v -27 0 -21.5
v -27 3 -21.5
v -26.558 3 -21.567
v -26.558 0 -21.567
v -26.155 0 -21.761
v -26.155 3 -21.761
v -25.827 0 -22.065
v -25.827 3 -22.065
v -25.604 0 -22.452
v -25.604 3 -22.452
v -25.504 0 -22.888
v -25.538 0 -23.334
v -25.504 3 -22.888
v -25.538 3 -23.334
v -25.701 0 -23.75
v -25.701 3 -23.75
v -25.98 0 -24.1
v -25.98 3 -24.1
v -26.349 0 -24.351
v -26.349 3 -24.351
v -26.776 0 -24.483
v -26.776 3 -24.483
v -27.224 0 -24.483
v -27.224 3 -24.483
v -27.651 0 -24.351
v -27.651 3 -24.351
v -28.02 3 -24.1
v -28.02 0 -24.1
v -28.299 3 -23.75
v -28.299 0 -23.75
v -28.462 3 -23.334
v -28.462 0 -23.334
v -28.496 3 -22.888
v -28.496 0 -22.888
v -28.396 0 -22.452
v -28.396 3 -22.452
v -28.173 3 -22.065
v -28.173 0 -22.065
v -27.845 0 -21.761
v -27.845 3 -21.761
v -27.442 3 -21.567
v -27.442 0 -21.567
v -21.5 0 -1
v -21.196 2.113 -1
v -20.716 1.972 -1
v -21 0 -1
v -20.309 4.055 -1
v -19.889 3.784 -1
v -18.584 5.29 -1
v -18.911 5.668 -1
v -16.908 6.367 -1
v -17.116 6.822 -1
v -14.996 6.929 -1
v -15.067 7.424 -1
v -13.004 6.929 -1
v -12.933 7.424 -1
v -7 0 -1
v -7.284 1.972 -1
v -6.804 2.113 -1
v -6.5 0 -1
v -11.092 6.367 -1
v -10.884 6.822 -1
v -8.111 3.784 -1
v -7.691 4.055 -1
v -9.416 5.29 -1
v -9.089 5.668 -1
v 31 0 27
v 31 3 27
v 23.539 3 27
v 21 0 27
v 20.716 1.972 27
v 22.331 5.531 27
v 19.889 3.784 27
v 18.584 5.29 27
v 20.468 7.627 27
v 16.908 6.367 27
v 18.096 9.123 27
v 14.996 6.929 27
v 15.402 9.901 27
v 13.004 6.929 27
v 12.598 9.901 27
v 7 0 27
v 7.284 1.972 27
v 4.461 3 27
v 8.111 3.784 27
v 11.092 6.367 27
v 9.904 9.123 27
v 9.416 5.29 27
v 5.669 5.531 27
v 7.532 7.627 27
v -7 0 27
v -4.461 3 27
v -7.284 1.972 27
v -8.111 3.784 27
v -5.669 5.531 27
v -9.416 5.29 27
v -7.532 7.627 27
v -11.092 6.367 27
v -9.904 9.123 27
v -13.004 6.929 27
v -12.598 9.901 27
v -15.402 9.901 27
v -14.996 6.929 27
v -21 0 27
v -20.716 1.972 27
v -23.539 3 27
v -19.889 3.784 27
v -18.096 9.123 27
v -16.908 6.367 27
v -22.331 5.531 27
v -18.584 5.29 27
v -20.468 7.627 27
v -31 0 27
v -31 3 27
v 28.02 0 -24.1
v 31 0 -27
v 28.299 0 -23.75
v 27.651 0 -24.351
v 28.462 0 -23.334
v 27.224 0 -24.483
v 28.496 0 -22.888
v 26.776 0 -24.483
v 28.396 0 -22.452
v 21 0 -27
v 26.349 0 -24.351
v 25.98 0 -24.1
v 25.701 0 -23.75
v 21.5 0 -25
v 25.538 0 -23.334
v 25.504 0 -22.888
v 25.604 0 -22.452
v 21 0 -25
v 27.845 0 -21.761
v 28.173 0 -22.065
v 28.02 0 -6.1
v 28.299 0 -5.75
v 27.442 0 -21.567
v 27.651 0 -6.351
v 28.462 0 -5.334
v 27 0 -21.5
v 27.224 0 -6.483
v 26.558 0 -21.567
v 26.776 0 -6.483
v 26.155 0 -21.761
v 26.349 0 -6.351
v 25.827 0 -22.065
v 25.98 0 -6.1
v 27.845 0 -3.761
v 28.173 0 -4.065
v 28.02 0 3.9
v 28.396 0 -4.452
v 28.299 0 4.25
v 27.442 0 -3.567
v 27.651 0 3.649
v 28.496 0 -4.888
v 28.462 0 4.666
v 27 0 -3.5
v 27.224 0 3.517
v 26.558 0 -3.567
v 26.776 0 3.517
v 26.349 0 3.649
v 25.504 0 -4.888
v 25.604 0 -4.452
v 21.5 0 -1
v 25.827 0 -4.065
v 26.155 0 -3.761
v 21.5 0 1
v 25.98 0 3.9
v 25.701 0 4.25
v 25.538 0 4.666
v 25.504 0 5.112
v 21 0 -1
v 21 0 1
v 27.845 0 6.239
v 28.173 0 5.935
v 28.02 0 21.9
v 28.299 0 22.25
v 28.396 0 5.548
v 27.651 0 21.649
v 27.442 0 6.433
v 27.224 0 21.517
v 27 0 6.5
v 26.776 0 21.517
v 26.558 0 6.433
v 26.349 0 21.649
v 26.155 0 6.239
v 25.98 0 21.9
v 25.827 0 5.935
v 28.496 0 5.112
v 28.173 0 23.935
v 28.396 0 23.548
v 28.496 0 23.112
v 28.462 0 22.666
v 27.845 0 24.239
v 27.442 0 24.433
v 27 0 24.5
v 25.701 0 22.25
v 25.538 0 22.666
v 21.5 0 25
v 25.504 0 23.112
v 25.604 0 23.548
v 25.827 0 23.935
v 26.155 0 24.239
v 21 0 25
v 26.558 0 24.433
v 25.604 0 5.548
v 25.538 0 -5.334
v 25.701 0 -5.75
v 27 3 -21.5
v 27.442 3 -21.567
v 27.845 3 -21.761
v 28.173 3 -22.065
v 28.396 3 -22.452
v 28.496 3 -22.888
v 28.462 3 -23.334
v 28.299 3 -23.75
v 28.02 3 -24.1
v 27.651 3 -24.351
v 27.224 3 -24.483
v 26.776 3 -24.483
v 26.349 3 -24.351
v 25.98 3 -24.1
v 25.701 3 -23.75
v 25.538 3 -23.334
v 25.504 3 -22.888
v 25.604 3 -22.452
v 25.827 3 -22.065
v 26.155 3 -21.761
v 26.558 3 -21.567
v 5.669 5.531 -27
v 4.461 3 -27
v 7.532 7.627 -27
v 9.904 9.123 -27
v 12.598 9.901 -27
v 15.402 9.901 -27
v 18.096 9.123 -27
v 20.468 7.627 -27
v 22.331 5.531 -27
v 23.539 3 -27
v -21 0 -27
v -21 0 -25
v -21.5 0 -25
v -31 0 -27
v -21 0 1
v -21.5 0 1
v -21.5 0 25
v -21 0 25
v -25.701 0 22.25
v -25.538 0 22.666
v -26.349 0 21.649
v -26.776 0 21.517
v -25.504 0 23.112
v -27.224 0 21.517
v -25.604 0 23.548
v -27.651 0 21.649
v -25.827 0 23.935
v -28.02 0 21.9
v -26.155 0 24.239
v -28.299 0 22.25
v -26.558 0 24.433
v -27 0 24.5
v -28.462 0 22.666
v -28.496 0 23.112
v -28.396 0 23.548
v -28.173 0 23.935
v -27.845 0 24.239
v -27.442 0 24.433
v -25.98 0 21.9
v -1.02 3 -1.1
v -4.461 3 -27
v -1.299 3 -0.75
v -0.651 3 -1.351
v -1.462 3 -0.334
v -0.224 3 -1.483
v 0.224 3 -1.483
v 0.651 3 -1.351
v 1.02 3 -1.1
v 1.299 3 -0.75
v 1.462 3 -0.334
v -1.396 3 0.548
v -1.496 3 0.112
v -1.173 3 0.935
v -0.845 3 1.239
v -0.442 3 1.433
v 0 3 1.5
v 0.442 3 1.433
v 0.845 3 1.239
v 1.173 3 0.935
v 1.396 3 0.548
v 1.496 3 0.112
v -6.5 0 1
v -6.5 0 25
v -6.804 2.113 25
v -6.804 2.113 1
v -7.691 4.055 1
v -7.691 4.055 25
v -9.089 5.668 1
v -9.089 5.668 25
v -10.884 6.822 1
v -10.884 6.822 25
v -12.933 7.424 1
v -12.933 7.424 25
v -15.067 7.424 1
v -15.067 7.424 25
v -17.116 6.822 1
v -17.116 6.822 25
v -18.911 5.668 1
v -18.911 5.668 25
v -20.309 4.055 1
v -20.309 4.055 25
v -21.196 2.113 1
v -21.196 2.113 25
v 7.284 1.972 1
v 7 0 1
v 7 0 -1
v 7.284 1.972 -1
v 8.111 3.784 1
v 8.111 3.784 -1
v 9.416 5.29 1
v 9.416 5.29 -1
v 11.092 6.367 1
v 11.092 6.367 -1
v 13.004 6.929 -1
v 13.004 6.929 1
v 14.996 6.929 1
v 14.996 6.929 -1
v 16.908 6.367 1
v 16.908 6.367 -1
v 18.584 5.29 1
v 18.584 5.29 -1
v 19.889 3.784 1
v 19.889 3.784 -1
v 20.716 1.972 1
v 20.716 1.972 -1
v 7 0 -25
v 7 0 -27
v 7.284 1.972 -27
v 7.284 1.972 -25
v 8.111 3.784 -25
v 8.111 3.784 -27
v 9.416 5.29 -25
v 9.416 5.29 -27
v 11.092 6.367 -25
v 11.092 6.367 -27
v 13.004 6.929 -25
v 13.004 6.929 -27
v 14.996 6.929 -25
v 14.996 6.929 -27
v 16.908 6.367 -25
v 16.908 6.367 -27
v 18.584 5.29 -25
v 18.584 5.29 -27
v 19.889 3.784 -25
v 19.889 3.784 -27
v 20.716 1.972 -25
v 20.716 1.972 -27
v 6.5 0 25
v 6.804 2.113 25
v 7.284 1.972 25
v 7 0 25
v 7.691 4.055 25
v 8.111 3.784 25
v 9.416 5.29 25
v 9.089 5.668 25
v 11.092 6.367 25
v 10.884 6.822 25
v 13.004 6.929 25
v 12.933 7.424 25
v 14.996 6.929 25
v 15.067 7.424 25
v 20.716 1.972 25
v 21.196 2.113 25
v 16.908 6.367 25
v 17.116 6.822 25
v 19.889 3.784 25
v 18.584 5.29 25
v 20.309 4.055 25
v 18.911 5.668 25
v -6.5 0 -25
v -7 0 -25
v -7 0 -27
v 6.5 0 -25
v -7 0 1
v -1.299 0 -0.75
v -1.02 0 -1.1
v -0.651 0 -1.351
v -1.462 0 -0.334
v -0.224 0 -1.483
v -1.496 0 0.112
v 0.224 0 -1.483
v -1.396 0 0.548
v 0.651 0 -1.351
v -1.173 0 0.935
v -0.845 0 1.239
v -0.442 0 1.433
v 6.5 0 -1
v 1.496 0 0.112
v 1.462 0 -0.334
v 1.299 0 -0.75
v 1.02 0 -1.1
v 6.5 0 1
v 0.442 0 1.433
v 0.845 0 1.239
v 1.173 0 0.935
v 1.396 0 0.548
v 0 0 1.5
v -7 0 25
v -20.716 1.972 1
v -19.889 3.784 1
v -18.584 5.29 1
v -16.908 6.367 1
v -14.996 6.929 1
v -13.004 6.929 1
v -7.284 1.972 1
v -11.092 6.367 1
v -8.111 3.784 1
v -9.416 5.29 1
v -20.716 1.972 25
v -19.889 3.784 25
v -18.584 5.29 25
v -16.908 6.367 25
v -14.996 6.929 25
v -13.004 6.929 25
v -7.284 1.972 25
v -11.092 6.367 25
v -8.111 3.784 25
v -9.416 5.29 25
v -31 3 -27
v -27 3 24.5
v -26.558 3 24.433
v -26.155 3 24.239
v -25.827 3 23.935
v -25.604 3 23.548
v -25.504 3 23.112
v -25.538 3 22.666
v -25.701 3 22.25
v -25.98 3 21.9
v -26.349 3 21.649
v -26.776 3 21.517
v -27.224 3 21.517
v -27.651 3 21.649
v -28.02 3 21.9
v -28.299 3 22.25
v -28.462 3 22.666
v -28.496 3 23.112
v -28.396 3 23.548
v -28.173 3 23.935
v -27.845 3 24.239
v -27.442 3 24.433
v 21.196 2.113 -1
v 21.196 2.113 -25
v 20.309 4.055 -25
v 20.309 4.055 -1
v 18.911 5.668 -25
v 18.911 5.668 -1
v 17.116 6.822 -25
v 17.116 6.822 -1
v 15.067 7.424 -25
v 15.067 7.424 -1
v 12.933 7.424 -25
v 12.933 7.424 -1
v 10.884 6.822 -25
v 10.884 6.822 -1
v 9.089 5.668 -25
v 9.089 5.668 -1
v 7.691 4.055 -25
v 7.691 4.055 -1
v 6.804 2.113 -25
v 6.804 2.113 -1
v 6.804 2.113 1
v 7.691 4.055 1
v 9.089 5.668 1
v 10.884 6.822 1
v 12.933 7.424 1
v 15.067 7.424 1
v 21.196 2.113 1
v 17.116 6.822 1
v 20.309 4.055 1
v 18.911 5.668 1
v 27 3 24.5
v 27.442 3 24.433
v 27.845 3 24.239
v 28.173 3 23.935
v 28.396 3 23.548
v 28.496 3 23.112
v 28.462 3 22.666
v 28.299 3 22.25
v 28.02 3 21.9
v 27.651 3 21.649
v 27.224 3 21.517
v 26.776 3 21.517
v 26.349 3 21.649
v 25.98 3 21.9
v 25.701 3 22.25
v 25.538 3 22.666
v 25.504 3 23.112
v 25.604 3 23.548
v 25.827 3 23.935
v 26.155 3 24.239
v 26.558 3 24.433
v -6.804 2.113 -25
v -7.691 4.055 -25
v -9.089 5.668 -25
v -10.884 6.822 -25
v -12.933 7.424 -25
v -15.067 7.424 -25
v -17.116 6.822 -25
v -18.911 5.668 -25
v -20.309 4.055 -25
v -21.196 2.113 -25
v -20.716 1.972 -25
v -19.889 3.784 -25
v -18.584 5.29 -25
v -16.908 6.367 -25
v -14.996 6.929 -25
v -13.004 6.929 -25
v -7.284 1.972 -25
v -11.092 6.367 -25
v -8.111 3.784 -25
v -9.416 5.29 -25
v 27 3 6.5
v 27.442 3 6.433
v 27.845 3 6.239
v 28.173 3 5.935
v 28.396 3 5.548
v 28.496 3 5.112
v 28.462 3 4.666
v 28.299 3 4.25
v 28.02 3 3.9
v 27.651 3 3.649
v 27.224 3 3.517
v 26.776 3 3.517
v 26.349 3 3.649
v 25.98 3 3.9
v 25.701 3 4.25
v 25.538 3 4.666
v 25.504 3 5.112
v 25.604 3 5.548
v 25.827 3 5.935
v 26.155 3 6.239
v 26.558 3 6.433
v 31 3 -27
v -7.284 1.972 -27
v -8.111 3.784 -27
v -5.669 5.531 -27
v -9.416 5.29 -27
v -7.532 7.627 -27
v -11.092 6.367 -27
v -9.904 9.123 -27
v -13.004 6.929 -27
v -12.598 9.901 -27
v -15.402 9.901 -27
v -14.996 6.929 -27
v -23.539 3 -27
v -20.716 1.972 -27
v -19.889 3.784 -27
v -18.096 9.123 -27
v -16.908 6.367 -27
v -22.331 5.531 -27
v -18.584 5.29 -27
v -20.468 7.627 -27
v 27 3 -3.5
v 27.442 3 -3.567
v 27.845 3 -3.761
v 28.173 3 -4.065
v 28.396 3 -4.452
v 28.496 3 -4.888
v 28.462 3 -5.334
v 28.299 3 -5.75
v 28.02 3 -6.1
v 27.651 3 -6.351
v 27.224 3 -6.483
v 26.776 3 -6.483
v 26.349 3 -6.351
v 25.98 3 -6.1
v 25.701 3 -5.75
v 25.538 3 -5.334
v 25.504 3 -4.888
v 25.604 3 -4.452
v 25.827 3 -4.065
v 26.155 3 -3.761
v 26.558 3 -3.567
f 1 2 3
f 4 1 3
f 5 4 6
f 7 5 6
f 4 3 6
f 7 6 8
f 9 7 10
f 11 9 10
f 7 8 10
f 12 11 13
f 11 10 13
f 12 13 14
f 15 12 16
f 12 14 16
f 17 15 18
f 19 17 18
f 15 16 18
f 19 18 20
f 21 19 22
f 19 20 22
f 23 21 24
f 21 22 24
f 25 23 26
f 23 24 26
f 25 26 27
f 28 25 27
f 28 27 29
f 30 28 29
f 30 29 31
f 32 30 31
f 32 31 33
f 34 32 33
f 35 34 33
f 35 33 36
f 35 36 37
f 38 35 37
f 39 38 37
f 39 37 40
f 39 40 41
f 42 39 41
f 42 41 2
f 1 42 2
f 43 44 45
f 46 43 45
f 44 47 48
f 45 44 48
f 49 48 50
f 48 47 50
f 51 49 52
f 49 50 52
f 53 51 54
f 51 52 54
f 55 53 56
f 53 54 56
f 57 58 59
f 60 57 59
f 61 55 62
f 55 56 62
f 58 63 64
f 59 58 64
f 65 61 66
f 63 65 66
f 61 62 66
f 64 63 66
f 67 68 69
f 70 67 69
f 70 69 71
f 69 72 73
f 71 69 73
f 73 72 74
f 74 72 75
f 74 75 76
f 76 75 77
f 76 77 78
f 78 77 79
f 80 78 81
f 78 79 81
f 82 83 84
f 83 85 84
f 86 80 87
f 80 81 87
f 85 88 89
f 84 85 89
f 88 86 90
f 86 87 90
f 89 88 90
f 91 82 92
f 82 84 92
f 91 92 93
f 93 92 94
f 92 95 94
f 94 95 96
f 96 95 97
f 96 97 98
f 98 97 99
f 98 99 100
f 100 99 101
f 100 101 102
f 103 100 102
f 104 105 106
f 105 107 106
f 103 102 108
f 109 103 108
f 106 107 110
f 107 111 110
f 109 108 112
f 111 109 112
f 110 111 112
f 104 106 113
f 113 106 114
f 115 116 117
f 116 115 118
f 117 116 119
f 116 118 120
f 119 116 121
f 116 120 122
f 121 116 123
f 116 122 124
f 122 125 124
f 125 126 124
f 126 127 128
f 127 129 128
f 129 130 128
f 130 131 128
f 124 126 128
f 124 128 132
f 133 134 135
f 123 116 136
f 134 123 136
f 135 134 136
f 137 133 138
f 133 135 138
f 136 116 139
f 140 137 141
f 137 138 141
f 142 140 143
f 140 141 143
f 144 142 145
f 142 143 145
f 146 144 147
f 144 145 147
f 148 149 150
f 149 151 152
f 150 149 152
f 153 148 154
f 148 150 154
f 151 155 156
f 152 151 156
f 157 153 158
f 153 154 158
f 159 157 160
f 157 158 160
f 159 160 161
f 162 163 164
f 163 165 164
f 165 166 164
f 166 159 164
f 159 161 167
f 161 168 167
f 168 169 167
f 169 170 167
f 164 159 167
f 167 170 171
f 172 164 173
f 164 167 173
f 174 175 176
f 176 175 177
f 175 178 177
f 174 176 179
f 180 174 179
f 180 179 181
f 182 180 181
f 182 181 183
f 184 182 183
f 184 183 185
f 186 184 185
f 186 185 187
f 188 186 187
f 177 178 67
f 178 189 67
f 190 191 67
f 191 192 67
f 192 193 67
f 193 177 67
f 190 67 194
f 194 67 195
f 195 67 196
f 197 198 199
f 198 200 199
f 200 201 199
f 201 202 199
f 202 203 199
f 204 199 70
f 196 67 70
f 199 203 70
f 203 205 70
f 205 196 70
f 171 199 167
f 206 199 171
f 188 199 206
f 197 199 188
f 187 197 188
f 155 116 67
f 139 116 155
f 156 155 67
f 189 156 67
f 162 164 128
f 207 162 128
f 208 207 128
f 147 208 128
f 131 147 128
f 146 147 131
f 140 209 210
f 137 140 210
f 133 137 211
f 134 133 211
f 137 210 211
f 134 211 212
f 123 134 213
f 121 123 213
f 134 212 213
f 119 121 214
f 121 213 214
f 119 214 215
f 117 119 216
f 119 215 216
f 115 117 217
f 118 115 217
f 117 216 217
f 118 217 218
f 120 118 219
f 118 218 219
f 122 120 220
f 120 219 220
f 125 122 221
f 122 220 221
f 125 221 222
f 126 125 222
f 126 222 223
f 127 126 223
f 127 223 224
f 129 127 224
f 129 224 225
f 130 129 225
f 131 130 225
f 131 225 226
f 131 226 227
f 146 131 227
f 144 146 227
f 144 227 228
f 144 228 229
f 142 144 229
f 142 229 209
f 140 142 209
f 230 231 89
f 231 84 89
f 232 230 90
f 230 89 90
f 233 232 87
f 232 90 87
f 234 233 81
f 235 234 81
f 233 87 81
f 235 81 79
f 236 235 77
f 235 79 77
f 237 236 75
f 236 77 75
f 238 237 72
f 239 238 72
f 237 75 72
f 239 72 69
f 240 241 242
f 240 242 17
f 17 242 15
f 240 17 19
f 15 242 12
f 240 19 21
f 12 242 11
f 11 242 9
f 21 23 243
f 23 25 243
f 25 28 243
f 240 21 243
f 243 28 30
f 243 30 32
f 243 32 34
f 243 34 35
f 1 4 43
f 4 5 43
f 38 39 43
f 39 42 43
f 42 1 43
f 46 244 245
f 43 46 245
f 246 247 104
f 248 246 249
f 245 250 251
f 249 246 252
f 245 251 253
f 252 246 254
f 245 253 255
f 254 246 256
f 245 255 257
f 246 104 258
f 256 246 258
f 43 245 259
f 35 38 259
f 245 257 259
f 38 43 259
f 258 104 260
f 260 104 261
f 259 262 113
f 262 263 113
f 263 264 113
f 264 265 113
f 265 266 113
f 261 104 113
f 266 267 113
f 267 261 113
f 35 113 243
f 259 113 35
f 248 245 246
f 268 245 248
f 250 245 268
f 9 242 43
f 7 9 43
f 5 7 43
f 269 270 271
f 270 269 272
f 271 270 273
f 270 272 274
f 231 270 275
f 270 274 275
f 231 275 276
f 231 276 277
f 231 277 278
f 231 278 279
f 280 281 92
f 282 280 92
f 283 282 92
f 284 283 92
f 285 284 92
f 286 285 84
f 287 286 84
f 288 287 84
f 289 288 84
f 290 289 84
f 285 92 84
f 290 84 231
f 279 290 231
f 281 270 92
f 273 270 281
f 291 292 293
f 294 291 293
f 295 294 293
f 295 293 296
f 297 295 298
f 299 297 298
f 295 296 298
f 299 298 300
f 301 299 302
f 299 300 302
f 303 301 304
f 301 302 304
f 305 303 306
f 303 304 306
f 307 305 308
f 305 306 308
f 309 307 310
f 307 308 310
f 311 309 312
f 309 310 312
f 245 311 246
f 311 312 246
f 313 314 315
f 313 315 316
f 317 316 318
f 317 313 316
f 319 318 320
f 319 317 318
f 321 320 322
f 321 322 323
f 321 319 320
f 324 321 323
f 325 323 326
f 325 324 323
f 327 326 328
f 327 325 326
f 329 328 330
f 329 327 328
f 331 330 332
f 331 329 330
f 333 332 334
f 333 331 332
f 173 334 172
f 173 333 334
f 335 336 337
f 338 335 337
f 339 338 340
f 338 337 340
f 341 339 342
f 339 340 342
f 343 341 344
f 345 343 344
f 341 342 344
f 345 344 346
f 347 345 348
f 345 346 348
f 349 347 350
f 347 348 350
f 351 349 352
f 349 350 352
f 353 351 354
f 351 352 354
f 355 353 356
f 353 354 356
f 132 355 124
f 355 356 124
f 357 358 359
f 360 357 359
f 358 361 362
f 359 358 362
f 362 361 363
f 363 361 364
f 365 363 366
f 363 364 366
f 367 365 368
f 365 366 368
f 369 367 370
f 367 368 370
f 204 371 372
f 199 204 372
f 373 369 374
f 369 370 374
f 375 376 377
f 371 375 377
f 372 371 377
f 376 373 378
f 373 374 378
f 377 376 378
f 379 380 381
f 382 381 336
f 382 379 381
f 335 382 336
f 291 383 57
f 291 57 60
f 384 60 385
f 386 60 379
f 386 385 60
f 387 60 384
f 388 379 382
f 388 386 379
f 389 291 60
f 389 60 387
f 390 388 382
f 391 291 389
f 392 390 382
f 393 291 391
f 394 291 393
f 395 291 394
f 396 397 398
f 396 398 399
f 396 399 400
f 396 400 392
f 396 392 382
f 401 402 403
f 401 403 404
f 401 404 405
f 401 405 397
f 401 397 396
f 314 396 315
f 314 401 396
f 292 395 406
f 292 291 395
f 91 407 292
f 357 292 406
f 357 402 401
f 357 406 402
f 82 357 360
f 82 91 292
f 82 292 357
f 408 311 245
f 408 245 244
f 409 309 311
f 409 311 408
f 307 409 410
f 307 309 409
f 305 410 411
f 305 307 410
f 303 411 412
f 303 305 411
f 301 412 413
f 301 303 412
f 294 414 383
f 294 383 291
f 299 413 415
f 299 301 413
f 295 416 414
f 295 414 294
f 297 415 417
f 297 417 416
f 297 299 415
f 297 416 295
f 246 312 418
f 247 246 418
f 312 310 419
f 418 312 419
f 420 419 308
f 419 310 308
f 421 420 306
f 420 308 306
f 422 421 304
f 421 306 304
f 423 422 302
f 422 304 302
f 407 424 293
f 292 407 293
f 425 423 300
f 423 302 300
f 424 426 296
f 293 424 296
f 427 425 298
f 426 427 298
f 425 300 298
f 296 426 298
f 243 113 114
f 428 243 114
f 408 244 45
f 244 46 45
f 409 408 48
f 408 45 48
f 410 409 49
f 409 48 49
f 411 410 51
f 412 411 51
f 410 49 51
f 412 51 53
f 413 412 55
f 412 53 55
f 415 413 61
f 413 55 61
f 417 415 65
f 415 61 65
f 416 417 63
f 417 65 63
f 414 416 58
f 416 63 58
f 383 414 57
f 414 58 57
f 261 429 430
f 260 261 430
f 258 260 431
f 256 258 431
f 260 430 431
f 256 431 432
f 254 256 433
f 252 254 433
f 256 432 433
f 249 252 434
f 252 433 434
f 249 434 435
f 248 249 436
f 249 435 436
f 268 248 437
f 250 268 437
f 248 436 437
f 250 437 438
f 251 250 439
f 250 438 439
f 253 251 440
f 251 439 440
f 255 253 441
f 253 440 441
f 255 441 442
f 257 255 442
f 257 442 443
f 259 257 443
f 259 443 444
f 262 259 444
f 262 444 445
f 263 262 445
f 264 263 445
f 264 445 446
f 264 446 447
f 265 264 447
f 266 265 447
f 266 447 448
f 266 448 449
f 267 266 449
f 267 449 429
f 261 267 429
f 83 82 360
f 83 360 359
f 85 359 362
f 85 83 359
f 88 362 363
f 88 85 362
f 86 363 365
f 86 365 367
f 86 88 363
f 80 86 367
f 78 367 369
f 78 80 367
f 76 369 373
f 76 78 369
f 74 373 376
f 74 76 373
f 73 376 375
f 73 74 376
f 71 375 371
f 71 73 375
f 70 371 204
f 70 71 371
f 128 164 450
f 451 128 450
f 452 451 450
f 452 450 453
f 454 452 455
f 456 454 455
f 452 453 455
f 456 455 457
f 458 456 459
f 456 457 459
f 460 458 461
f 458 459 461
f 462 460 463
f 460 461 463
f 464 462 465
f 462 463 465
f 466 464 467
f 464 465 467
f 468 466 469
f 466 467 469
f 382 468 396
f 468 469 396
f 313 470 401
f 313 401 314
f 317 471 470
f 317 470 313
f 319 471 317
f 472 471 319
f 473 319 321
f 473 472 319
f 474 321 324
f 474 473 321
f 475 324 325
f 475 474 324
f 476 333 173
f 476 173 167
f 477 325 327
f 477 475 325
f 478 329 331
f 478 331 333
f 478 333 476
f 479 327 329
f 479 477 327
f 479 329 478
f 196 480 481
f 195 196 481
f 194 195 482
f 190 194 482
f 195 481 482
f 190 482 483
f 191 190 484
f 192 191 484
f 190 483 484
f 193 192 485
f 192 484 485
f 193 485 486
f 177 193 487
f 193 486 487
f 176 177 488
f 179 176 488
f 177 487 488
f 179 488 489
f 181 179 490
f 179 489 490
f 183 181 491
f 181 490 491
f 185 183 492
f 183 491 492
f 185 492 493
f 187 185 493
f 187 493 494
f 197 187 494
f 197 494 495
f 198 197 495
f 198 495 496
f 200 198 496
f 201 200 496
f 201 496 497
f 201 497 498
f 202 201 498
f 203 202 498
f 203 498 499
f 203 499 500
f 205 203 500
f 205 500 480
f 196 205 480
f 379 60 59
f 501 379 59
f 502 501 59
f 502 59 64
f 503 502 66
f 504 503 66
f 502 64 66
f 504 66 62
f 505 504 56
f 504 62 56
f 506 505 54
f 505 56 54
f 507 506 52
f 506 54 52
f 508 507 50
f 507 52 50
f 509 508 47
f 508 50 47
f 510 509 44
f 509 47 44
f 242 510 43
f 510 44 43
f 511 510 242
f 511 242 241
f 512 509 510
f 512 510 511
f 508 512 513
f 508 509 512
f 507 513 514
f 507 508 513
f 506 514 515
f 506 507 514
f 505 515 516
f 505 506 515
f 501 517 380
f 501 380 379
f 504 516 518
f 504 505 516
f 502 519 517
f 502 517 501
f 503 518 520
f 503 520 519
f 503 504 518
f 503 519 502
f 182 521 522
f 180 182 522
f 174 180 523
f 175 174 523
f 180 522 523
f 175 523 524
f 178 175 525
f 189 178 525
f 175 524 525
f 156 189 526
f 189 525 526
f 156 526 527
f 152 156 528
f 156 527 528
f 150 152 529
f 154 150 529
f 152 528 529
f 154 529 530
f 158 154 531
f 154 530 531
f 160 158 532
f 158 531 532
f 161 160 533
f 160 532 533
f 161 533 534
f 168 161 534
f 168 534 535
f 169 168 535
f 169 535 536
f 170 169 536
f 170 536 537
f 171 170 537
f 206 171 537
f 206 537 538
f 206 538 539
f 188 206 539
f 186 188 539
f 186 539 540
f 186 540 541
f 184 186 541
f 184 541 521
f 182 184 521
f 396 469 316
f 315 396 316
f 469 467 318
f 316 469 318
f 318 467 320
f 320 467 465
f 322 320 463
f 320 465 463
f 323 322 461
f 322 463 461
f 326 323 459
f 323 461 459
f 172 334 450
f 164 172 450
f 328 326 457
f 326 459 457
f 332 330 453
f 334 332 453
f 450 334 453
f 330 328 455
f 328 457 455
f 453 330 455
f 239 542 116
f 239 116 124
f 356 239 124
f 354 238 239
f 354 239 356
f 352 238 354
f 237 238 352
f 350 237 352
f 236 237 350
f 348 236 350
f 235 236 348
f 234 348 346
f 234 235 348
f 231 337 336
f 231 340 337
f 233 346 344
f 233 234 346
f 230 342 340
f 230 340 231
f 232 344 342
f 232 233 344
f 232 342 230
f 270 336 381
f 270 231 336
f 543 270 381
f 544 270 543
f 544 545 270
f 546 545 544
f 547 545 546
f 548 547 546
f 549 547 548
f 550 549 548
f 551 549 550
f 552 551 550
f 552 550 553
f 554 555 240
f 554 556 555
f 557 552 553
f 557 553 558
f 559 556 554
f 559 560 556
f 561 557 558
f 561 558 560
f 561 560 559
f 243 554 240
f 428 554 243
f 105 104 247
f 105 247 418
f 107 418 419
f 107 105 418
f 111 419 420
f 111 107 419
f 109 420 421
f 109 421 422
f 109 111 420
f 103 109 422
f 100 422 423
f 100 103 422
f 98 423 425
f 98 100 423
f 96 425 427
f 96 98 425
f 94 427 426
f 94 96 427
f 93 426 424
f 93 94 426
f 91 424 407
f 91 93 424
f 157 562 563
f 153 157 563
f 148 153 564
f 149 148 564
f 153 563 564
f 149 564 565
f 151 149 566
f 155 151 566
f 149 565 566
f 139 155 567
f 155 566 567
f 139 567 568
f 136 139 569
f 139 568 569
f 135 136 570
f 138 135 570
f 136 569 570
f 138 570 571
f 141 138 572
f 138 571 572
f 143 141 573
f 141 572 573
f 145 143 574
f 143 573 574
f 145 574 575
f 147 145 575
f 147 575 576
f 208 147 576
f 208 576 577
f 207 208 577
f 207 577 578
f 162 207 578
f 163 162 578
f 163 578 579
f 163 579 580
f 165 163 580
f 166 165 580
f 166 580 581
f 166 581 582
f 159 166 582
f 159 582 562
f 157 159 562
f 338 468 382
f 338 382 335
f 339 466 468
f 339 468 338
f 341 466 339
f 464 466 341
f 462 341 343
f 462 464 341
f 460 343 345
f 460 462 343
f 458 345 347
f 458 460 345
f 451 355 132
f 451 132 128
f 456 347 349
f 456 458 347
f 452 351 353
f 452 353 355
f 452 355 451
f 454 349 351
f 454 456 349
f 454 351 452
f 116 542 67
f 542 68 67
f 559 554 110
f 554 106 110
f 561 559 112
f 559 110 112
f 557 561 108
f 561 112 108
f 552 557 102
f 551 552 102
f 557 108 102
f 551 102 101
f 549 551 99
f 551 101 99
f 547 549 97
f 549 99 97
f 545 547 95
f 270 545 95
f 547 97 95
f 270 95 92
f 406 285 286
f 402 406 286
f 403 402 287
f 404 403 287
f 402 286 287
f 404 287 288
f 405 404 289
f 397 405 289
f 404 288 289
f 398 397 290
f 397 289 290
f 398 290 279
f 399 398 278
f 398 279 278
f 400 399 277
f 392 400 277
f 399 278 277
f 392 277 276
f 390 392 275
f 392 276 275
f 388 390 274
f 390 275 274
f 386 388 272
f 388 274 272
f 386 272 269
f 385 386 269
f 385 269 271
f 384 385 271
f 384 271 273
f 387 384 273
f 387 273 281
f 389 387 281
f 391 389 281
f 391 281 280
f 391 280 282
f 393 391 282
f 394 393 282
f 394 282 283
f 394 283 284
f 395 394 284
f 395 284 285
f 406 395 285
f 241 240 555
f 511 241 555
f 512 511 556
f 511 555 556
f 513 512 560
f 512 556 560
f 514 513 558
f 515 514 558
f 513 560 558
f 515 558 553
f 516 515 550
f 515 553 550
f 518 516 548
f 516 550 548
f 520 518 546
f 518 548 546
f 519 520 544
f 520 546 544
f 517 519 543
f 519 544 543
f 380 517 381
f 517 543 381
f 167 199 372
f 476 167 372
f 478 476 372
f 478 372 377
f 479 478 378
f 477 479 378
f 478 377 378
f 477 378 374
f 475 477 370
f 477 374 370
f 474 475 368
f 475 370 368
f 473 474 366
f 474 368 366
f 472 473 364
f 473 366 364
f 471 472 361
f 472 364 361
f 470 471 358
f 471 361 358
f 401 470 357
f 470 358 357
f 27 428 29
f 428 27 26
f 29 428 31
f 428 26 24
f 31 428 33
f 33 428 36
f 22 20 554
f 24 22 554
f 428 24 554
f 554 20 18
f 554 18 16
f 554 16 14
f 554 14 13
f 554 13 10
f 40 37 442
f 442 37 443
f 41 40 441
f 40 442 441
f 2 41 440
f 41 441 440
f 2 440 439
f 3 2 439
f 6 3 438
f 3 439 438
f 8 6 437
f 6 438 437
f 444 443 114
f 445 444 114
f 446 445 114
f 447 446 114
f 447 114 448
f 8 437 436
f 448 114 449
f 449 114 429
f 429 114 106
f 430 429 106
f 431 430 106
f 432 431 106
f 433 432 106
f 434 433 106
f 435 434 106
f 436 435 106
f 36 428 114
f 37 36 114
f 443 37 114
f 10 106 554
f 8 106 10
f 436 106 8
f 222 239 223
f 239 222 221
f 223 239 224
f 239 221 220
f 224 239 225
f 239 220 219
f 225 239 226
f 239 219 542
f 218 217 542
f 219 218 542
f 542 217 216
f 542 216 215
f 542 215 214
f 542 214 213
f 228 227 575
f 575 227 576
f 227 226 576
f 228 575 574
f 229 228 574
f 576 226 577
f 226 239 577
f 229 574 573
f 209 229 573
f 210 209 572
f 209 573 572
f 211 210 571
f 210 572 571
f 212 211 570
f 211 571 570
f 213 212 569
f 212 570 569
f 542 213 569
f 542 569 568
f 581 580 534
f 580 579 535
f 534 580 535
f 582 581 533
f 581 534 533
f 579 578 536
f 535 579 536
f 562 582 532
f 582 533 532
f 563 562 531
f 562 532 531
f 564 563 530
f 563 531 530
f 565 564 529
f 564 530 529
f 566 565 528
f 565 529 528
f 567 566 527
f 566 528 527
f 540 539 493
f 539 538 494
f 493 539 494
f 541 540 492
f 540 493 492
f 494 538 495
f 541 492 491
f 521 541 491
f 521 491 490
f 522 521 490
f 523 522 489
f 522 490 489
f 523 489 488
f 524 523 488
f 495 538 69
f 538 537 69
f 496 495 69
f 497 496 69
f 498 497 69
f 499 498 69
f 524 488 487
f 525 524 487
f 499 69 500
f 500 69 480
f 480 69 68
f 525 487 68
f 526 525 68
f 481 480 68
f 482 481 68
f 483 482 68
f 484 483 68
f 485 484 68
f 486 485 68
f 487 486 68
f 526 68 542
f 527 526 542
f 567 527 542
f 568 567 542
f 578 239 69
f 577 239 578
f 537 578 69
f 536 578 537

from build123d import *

# Parameters (mm, degrees)
BOSS_EXTRUDE1_DEPTH = 27
BOSS_EXTRUDE2_DEPTH = 2
BOSS_EXTRUDE3_DEPTH = 1
SKETCH4_R           = 1.5
CUT_EXTRUDE1_DEPTH  = 42.701318924
SKETCH5_R           = 1.5
CUT_EXTRUDE2_DEPTH  = 10


with BuildPart() as part:
    # Sketch1 → Boss-Extrude1 (new, symmetric)
    with BuildSketch(Plane.XY):
        with BuildLine():
            Line((-31, 3), (-23.539392014, 3))
            ThreePointArc((-23.539392014, 3), (-14, 10), (-4.460607986, 3))
            Line((-4.460607986, 3), (4.460607986, 3))
            ThreePointArc((4.460607986, 3), (14, 10), (23.539392014, 3))
            Line((23.539392014, 3), (31, 3))
            Line((31, 3), (31, 0))
            Line((31, 0), (21.5, 0))
            ThreePointArc((21.5, 0), (14, 7.5), (6.5, 0))
            Line((6.5, 0), (-6.5, 0))
            ThreePointArc((-6.5, 0), (-14, 7.5), (-21.5, 0))
            Line((-21.5, 0), (-31, 0))
            Line((-31, 0), (-31, 3))
        make_face()
    extrude(amount=BOSS_EXTRUDE1_DEPTH, both=True)

    # Sketch2 → Boss-Extrude2 (add)
    with BuildSketch(Plane.XY.offset(27)):
        with BuildLine():
            Line((-22, 0), (-21, 0))
            ThreePointArc((-21, 0), (-14, 7), (-7, 0))
            Line((-7, 0), (-6, 0))
            ThreePointArc((-6, 0), (-14, 8), (-22, 0))
        make_face()
        with BuildLine():
            Line((21, 0), (22, 0))
            ThreePointArc((22, 0), (14, 8), (6, 0))
            Line((6, 0), (7, 0))
            ThreePointArc((7, 0), (14, 7), (21, 0))
        make_face()
    boss_extrude2 = extrude(amount=-BOSS_EXTRUDE2_DEPTH)

    # Mirror1: Boss-Extrude2 across plane
    add(boss_extrude2.mirror(Plane.XY))

    # Sketch3 → Boss-Extrude3 (add, symmetric)
    with BuildSketch(Plane.XY):
        with BuildLine():
            Line((-22, 0), (-21, 0))
            ThreePointArc((-21, 0), (-14, 7), (-7, 0))
            Line((-7, 0), (-6, 0))
            ThreePointArc((-6, 0), (-14, 8), (-22, 0))
        make_face()
        with BuildLine():
            Line((6, 0), (7, 0))
            ThreePointArc((7, 0), (14, 7), (21, 0))
            Line((21, 0), (22, 0))
            ThreePointArc((22, 0), (14, 8), (6, 0))
        make_face()
    extrude(amount=BOSS_EXTRUDE3_DEPTH, both=True)

    # Sketch4 → Cut-Extrude1 (cut, through all)
    with BuildSketch(Plane(origin=(0, 3, 0), x_dir=(1, 0, 0), z_dir=(0, 1, 0))):
        with Locations(Location((-27, 23, 0), (0, 0, 270))):
            Circle(SKETCH4_R)
        with Locations(Location((-27, -23, 0), (0, 0, 270))):
            Circle(SKETCH4_R)
        with Locations(Location((27, -23, 0), (0, 0, 270))):
            Circle(SKETCH4_R)
        with Locations(Location((27, 23, 0), (0, 0, 270))):
            Circle(SKETCH4_R)
        with Locations(Location((0, 0, 0), (0, 0, 270))):
            Circle(SKETCH4_R)
    extrude(amount=-CUT_EXTRUDE1_DEPTH, mode=Mode.SUBTRACT)

    # Sketch5 → Cut-Extrude2 (cut)
    with BuildSketch(Plane(origin=(0, 3, 0), x_dir=(1, 0, 0), z_dir=(0, 1, 0))):
        with Locations(Location((27, 5, 0), (0, 0, 270))):
            Circle(SKETCH5_R)
        with Locations(Location((27, -5, 0), (0, 0, 270))):
            Circle(SKETCH5_R)
    extrude(amount=-CUT_EXTRUDE2_DEPTH, mode=Mode.SUBTRACT)


solid = part.part
